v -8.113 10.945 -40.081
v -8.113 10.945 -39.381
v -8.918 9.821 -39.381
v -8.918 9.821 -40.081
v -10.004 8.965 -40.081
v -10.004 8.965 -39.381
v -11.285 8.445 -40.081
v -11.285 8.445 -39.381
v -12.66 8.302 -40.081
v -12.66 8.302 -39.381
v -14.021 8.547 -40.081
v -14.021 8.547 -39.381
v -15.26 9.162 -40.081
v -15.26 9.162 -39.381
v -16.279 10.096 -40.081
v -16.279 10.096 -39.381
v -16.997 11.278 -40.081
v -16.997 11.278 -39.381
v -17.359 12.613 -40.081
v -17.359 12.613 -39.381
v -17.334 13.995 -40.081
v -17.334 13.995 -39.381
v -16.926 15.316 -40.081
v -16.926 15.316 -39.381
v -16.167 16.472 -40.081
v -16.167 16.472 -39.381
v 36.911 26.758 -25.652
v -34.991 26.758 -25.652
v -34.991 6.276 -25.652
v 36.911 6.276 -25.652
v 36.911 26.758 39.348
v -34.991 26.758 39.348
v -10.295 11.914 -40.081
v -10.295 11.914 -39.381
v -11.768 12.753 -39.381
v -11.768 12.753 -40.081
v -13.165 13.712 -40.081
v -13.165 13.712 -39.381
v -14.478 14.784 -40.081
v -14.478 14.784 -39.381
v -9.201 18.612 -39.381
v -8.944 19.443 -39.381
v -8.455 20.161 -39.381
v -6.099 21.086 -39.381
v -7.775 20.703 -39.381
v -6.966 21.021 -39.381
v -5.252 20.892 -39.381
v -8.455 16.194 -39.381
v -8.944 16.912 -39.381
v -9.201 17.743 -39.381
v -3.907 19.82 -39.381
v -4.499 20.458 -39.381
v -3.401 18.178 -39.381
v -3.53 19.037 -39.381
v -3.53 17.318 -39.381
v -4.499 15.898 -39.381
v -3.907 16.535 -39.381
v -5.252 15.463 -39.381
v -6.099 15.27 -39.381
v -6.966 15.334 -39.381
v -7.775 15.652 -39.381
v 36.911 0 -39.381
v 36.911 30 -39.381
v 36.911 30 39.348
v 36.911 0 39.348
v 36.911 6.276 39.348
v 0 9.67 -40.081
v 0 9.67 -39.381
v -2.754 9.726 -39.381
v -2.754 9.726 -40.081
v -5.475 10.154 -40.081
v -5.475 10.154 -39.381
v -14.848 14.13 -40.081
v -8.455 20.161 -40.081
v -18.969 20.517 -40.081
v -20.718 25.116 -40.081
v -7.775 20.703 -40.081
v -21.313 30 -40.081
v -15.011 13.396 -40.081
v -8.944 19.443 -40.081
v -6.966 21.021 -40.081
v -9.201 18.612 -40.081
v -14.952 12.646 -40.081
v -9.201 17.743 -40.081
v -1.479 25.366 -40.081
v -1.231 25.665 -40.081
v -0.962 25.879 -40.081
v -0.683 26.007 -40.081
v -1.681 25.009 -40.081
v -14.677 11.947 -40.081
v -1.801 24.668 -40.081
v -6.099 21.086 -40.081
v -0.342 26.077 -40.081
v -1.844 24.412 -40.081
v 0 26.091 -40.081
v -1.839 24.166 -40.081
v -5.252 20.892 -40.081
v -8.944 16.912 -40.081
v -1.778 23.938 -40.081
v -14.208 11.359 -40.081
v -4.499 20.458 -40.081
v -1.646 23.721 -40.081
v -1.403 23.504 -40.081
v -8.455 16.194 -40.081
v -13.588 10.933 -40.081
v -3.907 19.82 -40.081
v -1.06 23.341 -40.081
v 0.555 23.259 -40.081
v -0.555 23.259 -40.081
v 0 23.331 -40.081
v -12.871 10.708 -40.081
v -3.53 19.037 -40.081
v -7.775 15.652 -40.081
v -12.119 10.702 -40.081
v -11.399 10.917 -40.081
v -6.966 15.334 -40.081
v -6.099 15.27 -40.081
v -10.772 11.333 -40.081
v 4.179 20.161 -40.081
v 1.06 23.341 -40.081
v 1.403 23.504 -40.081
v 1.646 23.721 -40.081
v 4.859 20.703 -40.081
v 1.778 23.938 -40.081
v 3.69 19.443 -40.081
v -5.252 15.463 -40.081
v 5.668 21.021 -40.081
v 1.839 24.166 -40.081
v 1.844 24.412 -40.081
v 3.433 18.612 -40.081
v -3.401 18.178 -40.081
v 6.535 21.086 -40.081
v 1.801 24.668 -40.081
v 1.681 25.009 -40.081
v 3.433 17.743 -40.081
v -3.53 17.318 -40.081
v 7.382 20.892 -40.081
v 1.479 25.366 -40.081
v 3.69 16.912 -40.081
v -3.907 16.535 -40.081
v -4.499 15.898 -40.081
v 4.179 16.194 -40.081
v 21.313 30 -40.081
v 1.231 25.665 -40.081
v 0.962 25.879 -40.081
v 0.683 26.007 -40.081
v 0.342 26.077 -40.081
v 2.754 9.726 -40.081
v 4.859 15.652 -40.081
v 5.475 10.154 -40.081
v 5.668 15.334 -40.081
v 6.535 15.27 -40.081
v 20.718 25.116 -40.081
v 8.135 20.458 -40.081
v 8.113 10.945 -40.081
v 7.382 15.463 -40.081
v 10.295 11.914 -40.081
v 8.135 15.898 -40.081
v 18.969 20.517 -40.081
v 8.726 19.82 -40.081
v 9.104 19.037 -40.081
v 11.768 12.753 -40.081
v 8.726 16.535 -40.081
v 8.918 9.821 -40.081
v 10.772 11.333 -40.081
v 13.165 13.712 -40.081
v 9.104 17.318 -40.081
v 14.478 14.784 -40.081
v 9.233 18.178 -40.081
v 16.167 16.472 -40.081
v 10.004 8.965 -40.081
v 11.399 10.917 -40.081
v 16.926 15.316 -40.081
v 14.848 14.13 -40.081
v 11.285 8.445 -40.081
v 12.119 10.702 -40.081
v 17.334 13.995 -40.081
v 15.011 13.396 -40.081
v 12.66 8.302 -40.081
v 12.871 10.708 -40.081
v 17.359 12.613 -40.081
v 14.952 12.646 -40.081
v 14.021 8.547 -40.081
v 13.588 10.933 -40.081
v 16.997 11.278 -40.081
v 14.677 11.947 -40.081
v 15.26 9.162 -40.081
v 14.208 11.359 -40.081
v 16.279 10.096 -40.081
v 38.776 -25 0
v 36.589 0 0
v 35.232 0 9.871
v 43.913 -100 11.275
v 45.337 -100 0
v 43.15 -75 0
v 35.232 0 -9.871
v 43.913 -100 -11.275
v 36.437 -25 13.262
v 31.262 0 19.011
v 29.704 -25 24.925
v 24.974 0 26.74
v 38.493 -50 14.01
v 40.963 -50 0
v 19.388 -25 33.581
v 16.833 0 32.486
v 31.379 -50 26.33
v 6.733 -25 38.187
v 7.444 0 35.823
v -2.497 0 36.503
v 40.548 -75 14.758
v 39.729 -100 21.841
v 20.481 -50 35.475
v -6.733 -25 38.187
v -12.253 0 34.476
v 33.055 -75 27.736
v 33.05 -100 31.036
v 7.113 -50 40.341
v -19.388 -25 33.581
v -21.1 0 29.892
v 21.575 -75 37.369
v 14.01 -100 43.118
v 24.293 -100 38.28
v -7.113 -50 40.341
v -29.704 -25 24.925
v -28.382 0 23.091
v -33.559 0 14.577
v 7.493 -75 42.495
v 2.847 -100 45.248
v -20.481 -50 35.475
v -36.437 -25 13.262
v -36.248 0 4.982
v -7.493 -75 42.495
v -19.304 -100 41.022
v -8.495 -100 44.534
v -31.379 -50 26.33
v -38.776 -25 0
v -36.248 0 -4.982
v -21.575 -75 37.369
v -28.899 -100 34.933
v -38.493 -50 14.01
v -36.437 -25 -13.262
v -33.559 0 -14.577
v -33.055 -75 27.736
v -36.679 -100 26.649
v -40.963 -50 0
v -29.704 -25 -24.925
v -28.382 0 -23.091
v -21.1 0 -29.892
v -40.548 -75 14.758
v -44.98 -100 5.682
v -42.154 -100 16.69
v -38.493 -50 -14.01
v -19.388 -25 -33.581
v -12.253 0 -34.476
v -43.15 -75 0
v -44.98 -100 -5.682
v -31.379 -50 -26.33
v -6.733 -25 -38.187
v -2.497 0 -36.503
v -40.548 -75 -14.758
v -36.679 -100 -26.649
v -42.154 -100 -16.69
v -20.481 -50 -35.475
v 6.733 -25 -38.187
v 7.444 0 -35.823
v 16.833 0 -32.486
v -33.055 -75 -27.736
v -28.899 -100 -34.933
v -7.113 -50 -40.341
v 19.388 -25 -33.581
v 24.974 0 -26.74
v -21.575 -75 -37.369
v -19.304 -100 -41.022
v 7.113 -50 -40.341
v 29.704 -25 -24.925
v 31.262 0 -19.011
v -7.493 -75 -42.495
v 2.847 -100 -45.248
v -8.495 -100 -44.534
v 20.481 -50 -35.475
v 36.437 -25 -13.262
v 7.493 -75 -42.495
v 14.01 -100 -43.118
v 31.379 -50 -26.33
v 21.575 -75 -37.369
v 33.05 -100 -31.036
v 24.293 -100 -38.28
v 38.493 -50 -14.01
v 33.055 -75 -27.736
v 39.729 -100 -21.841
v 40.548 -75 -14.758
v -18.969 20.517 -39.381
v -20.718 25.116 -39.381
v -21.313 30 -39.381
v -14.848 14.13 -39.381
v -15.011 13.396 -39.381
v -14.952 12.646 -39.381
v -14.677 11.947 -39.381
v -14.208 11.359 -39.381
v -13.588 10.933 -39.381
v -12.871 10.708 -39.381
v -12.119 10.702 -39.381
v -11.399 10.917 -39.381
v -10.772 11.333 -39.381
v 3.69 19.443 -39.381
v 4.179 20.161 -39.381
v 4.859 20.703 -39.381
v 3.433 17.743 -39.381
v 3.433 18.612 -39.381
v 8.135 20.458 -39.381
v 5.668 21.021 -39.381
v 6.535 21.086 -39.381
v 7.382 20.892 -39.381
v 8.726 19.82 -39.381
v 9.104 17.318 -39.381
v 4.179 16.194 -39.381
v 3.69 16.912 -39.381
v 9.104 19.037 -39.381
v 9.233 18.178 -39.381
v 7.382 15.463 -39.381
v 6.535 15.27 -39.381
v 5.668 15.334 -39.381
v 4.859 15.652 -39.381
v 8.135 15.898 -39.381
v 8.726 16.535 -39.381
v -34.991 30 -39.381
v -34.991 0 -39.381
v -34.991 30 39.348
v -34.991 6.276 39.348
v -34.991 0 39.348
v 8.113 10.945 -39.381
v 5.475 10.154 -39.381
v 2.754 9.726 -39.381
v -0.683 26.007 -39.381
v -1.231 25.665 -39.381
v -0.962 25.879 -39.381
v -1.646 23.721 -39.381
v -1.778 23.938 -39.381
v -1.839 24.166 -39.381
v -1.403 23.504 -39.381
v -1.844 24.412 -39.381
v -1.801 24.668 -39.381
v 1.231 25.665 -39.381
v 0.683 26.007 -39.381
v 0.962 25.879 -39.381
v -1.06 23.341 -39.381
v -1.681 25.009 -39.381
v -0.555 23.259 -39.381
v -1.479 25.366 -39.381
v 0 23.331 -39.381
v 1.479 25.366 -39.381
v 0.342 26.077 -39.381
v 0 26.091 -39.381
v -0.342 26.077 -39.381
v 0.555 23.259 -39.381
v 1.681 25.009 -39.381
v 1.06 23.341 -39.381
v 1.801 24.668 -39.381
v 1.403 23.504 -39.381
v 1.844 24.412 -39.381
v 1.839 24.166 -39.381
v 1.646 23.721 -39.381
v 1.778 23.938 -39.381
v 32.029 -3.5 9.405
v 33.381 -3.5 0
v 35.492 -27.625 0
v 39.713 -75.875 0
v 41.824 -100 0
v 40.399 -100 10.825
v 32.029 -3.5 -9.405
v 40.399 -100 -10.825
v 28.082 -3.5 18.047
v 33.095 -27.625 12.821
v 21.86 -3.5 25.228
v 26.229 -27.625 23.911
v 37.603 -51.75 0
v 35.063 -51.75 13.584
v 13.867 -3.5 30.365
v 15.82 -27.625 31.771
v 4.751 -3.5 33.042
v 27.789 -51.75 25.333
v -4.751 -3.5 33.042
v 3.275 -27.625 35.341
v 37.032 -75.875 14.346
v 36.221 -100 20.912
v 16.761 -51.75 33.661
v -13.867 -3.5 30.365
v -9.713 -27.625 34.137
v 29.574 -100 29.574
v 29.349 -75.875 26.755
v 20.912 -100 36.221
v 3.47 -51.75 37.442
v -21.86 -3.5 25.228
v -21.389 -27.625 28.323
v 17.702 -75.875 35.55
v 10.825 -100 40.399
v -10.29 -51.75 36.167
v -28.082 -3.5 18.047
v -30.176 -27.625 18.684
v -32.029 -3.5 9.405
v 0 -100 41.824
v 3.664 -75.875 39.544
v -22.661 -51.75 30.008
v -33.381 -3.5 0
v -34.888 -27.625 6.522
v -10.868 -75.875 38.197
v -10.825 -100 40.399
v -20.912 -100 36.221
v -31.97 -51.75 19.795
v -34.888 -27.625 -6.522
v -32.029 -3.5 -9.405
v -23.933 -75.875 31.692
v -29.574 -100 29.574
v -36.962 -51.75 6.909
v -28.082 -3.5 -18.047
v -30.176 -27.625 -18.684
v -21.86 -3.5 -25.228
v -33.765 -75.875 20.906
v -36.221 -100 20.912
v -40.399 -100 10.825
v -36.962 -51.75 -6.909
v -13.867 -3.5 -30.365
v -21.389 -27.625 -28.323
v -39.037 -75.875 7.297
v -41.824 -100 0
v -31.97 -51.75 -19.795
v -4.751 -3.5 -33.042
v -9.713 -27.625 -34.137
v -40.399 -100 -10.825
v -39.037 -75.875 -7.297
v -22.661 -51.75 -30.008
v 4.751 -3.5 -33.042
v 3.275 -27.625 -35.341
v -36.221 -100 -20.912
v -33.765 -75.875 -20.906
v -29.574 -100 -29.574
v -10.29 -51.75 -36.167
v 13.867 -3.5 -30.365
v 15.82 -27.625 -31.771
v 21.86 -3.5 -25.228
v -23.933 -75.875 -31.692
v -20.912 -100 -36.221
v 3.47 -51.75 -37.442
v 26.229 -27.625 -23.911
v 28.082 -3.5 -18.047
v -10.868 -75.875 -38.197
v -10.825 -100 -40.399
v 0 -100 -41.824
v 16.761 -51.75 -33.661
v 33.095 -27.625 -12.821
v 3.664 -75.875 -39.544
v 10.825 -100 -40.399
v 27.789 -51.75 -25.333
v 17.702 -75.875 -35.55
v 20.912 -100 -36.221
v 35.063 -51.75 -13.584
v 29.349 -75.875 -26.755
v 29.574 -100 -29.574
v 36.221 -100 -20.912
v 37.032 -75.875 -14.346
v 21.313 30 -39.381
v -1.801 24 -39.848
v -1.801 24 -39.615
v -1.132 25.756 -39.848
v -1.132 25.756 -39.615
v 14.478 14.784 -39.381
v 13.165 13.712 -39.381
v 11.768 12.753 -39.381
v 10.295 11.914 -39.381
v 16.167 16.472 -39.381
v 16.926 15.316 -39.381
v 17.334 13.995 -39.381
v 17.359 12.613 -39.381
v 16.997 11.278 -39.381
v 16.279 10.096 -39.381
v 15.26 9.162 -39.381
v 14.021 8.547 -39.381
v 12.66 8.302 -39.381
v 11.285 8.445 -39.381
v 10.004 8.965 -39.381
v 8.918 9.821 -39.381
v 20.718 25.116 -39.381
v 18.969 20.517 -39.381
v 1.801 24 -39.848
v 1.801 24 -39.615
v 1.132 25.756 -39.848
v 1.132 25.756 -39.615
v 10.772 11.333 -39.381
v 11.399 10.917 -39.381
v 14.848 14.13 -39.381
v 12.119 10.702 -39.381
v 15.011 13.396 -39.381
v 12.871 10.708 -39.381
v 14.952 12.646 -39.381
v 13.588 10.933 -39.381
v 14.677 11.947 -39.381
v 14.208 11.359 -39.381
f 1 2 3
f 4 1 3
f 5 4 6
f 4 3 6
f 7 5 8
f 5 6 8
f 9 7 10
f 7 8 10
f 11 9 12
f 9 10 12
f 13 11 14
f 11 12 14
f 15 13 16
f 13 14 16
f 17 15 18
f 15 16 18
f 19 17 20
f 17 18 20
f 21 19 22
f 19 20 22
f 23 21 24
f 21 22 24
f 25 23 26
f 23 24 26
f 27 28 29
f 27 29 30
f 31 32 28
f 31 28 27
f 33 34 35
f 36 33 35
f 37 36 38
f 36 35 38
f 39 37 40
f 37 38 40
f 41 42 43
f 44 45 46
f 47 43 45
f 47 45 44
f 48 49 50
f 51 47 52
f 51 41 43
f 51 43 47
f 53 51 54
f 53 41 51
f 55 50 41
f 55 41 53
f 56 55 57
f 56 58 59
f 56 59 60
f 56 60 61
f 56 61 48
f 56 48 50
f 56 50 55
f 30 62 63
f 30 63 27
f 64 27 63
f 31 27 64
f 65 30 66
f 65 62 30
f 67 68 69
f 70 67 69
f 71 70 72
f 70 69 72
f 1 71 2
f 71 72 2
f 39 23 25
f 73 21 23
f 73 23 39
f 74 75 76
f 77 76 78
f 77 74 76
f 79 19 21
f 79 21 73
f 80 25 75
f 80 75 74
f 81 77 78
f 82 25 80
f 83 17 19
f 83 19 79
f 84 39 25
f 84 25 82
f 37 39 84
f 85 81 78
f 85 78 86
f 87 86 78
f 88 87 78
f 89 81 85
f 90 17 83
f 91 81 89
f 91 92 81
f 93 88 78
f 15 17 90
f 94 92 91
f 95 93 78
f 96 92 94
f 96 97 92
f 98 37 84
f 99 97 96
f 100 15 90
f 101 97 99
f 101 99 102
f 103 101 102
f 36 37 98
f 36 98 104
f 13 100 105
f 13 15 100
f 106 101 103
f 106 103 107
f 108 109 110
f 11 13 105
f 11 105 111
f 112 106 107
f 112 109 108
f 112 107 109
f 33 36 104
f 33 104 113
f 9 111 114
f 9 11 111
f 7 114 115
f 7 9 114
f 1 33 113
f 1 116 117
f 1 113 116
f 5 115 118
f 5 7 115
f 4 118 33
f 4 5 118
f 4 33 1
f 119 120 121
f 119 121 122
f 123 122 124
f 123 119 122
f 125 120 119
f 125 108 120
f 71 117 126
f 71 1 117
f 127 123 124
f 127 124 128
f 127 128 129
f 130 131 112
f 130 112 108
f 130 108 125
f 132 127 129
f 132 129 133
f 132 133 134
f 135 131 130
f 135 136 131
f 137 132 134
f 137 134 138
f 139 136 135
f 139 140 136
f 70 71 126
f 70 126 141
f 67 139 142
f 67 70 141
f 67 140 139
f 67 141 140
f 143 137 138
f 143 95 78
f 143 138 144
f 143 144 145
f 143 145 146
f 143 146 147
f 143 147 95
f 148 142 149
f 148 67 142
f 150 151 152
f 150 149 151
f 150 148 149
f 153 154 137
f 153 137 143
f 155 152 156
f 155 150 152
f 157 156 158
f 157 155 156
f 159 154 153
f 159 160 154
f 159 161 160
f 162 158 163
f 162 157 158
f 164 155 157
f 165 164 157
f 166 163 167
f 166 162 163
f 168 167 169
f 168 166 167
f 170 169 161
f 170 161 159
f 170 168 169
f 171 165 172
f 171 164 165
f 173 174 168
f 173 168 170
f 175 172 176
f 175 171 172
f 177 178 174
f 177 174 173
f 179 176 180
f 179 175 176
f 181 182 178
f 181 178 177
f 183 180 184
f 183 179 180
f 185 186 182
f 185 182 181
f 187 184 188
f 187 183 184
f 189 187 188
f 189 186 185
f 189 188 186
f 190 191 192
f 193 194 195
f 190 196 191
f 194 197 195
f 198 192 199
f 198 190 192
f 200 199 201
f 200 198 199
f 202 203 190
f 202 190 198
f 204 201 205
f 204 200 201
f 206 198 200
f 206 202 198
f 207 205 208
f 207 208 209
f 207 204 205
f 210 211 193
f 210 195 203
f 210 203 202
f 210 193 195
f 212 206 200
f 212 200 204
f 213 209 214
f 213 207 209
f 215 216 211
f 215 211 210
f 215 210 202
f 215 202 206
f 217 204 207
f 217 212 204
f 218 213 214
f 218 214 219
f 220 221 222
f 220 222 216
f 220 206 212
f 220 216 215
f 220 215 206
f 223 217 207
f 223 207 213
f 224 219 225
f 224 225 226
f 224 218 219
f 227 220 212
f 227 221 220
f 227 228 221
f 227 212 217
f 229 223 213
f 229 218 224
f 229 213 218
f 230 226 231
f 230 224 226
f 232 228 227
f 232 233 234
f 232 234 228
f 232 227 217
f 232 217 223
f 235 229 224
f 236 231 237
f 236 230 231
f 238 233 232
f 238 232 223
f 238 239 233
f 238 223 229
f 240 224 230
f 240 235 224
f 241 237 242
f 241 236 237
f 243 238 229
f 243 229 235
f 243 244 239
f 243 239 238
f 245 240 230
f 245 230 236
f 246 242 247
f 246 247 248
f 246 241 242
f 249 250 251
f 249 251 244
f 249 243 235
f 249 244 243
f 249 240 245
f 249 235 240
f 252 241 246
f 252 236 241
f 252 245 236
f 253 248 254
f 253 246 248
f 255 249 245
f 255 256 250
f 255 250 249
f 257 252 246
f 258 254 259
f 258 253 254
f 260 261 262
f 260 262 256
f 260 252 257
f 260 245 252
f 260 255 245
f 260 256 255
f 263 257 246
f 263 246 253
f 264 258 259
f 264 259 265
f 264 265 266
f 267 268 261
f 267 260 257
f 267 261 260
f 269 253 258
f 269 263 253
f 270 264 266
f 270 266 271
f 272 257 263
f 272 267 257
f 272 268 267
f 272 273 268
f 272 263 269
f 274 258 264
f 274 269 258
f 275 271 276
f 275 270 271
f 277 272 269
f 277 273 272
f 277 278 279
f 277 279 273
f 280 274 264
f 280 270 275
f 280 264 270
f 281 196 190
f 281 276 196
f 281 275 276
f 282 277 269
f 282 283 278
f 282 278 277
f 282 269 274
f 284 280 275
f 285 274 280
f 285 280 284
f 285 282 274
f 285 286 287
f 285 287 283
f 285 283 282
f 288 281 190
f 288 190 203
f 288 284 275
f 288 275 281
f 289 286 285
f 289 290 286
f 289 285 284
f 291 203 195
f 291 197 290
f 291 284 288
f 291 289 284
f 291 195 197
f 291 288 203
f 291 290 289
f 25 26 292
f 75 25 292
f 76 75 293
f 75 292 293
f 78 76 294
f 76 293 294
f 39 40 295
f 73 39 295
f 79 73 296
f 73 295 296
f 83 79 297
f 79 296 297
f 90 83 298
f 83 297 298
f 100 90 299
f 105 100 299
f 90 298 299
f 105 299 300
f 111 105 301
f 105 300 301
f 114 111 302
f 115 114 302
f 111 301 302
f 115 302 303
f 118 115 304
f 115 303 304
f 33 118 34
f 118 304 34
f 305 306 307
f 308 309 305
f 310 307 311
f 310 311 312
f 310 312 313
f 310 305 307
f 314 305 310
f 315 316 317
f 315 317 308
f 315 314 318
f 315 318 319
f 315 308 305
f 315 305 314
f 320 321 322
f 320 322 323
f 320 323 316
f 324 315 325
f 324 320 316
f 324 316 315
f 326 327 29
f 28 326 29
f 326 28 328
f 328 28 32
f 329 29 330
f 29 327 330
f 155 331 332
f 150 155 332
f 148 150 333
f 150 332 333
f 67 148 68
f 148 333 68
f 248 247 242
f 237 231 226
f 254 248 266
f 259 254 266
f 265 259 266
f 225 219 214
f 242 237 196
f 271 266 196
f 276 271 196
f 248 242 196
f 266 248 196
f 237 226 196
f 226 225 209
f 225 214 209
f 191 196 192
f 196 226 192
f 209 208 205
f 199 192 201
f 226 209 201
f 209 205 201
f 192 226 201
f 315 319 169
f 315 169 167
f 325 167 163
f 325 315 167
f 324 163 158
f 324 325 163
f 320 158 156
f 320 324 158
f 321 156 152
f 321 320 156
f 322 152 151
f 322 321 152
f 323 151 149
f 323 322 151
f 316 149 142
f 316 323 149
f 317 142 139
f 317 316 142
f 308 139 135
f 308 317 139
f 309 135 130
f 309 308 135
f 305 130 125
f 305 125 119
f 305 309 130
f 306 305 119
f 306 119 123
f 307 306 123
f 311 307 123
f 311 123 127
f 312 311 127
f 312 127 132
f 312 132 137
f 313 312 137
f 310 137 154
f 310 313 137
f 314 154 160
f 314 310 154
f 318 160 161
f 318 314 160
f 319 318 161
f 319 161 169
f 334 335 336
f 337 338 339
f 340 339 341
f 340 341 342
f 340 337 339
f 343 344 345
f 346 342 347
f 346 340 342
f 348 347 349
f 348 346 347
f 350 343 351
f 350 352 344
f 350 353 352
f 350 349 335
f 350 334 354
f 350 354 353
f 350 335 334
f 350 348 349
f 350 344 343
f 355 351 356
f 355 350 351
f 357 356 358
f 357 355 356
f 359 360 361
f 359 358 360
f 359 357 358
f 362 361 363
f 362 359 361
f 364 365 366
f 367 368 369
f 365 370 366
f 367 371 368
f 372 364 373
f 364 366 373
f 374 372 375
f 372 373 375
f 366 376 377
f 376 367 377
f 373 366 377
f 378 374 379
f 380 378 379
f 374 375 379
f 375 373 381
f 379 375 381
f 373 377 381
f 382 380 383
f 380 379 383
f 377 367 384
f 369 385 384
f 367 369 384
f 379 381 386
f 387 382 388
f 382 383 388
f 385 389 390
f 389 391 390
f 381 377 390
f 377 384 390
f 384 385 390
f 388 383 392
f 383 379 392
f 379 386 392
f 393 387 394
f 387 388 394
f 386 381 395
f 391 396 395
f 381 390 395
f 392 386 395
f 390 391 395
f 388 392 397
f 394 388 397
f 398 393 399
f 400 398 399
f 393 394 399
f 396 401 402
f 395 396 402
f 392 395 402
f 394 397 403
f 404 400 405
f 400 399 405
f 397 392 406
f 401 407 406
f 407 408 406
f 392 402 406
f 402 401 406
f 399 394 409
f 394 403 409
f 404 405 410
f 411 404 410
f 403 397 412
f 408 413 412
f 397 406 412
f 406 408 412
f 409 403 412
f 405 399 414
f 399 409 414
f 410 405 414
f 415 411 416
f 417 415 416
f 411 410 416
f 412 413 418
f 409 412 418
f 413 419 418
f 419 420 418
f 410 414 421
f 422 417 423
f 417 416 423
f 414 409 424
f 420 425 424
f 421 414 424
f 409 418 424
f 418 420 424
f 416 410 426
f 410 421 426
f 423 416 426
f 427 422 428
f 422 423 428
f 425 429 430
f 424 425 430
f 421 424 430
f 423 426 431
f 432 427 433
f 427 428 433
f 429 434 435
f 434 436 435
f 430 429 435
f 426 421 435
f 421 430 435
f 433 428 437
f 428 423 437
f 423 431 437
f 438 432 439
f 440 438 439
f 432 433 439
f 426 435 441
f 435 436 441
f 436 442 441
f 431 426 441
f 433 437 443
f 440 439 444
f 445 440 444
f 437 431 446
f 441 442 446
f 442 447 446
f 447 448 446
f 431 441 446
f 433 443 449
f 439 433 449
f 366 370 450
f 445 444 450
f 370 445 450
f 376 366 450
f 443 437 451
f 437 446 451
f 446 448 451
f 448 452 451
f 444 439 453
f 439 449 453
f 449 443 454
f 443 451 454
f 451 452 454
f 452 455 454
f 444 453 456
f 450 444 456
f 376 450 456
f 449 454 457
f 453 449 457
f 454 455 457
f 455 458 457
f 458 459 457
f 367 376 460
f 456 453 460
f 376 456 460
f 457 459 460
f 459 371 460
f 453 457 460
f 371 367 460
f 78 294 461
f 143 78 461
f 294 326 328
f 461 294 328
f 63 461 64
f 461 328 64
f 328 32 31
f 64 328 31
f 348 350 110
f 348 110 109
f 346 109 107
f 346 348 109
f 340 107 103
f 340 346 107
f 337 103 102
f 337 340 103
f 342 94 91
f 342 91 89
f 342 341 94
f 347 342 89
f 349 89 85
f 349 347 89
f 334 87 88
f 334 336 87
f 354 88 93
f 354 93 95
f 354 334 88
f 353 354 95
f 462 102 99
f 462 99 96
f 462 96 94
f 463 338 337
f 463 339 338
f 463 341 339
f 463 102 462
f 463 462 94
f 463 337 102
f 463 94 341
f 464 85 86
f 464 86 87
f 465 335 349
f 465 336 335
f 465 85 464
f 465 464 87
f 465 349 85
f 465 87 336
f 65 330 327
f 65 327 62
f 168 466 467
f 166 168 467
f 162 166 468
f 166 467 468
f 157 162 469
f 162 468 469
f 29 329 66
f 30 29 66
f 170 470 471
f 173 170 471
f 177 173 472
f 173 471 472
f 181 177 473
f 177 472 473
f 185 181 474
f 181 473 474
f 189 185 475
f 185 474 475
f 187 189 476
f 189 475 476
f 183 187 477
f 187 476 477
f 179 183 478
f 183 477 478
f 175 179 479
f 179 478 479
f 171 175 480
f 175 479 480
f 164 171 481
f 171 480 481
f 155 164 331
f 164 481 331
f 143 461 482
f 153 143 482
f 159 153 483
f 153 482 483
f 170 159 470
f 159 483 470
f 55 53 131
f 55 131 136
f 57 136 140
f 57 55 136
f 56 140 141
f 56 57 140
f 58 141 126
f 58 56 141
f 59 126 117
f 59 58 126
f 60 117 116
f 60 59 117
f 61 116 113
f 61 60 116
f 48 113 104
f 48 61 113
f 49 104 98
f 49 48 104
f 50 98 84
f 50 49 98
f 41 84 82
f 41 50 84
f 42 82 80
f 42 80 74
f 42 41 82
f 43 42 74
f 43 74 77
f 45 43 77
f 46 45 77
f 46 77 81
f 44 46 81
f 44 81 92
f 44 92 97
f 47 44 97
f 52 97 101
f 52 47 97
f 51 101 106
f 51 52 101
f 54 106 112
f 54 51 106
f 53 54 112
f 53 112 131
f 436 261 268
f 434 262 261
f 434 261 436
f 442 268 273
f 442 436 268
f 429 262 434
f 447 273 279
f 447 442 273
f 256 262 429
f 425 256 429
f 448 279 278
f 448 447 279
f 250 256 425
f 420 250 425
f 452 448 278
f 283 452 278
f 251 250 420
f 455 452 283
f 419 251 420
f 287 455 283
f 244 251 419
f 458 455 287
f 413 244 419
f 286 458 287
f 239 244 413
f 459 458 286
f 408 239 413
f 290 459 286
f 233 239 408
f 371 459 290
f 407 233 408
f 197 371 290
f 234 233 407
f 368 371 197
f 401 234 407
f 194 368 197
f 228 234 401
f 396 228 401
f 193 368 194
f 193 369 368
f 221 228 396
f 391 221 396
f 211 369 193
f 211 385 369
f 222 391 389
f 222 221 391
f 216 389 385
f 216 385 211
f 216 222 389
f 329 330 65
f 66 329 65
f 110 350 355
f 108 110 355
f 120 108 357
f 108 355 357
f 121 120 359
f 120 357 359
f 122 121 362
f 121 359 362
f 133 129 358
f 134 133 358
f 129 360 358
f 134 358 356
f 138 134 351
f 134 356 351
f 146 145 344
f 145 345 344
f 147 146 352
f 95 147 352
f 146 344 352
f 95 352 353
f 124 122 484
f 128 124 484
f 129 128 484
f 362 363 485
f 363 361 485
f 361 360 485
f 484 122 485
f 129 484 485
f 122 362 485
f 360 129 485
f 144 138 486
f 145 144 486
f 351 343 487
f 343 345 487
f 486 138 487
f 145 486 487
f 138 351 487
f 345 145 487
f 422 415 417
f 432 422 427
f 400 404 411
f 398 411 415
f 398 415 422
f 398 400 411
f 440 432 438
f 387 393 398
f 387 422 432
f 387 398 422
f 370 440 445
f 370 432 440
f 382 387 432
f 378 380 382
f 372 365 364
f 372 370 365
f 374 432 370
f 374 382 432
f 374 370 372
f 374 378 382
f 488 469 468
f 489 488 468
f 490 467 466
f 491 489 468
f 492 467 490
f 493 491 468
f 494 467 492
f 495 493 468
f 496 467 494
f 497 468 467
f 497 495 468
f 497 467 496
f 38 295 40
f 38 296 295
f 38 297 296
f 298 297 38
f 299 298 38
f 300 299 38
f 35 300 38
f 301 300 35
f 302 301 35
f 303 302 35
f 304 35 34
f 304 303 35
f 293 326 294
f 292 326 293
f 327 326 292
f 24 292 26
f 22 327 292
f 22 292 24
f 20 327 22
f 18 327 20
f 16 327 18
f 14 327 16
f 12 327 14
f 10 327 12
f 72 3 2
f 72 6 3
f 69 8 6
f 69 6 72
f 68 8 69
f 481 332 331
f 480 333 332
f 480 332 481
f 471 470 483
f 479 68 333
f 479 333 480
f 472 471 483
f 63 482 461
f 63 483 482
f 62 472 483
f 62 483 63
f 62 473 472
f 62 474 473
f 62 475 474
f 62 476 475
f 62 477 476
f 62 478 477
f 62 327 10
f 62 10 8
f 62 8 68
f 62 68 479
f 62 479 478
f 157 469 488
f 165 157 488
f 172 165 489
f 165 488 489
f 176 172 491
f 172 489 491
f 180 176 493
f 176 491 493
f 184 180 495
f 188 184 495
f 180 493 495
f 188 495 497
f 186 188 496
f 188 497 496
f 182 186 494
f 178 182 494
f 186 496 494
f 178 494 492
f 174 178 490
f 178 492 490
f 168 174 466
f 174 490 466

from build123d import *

# Parameters (mm, degrees)
F0_W     = 71.9023197889
F0_H     = 78.7298418581
F1_DEPTH = 30
F2_R     = 36.5885181047
F3_DEPTH = 100
F3_TAPER = -5
F4_T     = -3.5
F5_W     = 71.9023197889
F5_H     = 20.4825603869
F6_DEPTH = 65
F7_R     = 2.9162112623
F8_DEPTH = 0.7


# Not quite as in the source:
# - a feature names something its author has since deleted; it is built from what else it names


with BuildPart() as f1:
    # F0 (on Front) → F1 (new body)
    with BuildSketch(Plane.XZ):
        with Locations((0.9601190686, -0.0165458769)):
            Rectangle(F0_W, F0_H)
    extrude(amount=-F1_DEPTH)

    # F5 (on face) → F6 (cut)
    with BuildSketch(Plane.XY.offset(39.3483750522)):
        with Locations((0.9601190686, 16.5169640677)):
            Rectangle(F5_W, F5_H)
    extrude(amount=-F6_DEPTH, mode=Mode.SUBTRACT)

    # F7 (on face) → F8 (join)
    with BuildSketch(Plane(origin=(0, 0, -39.3814668059), x_dir=(1, 0, 0), z_dir=(0, 0, -1))):
        with BuildLine():
            ThreePointArc((14.4776685496, -14.7840142781), (15.3469177119, -15.6031117856), (16.1666244153, -16.4717864964))
            ThreePointArc((16.1666244153, -16.4717864964), (15.2599699365, -9.1616381984), (8.1129894908, -10.9451630765))
            ThreePointArc((8.1129894908, -10.9451630765), (9.2183727795, -11.3975374989), (10.2953179003, -11.9139714633))
            ThreePointArc((10.2953179003, -11.9139714633), (13.9140775904, -11.1229307961), (14.4776685496, -14.7840142781))
        make_face()
        with BuildLine():
            Line((-21.3132604836, -30), (21.3132604836, -30))
            ThreePointArc((21.3132604836, -30), (19.9831382718, -22.7629352736), (16.1666244153, -16.4717864964))
            ThreePointArc((16.1666244153, -16.4717864964), (15.3469177119, -15.6031117856), (14.4776685496, -14.7840142781))
            ThreePointArc((14.4776685496, -14.7840142781), (12.4762517876, -13.2181928071), (10.2953179003, -11.9139714633))
            ThreePointArc((10.2953179003, -11.9139714633), (9.2183727795, -11.3975374989), (8.1129894908, -10.9451630765))
            ThreePointArc((8.1129894908, -10.9451630765), (4.1215049239, -9.8938814056), (0, -9.6695170536))
            ThreePointArc((0, -9.6695170536), (-4.1215049239, -9.8938814056), (-8.1129894908, -10.9451630765))
            ThreePointArc((-8.1129894908, -10.9451630765), (-9.2183727795, -11.3975374989), (-10.2953179003, -11.9139714633))
            ThreePointArc((-10.2953179003, -11.9139714633), (-12.4762517876, -13.2181928071), (-14.4776685496, -14.7840142781))
            ThreePointArc((-14.4776685496, -14.7840142781), (-15.3469177119, -15.6031117856), (-16.1666244153, -16.4717864964))
            ThreePointArc((-16.1666244153, -16.4717864964), (-19.9831382718, -22.7629352736), (-21.3132604836, -30))
        make_face()
        with BuildLine():
            add(Edge.make_bspline(
                [(0, -23.3312174678), (-0.816430616, -23.1064193373), (-2.3968803534, -23.7472193633), (-1.266410215, -26.0162755449), (-0.3809565691, -26.0923855136), (0, -26.0908510536)],
                knots=[0, 0, 0, 0, 0.3606436386, 0.7173099723, 1, 1, 1, 1], degree=3))
            add(Edge.make_bspline(
                [(0, -23.3312174678), (0.816430616, -23.1064193373), (2.3968803534, -23.7472193633), (1.266410215, -26.0162755449), (0.3809565691, -26.0923855136), (0, -26.0908510536)],
                knots=[0, 0, 0, 0, 0.3606436386, 0.7173099723, 1, 1, 1, 1], degree=3))
        make_face(mode=Mode.SUBTRACT)
        with Locations((-6.3169230707, -18.1775894016)):
            Circle(F7_R, mode=Mode.SUBTRACT)
        with Locations((6.3169230707, -18.1775894016)):
            Circle(F7_R, mode=Mode.SUBTRACT)
        with BuildLine():
            ThreePointArc((-8.1129894908, -10.9451630765), (-15.2599699365, -9.1616381984), (-16.1666244153, -16.4717864964))
            ThreePointArc((-16.1666244153, -16.4717864964), (-15.3469177119, -15.6031117856), (-14.4776685496, -14.7840142781))
            ThreePointArc((-14.4776685496, -14.7840142781), (-13.9140775904, -11.1229307961), (-10.2953179003, -11.9139714633))
            ThreePointArc((-10.2953179003, -11.9139714633), (-9.2183727795, -11.3975374989), (-8.1129894908, -10.9451630765))
        make_face()
    extrude(amount=F8_DEPTH)


with BuildPart() as f3:
    # F2 (on Front) → F3 (new body)
    with BuildSketch(Plane.XZ):
        Circle(F2_R)
    extrude(amount=F3_DEPTH, taper=F3_TAPER)

    # F4
    f4_openings = [f3.faces().sort_by_distance(p)[0] for p in [
        (0, -100, 0),
    ]]
    offset(amount=F4_T, openings=f4_openings, kind=Kind.INTERSECTION)


solid = Compound([f1.part, f3.part])
